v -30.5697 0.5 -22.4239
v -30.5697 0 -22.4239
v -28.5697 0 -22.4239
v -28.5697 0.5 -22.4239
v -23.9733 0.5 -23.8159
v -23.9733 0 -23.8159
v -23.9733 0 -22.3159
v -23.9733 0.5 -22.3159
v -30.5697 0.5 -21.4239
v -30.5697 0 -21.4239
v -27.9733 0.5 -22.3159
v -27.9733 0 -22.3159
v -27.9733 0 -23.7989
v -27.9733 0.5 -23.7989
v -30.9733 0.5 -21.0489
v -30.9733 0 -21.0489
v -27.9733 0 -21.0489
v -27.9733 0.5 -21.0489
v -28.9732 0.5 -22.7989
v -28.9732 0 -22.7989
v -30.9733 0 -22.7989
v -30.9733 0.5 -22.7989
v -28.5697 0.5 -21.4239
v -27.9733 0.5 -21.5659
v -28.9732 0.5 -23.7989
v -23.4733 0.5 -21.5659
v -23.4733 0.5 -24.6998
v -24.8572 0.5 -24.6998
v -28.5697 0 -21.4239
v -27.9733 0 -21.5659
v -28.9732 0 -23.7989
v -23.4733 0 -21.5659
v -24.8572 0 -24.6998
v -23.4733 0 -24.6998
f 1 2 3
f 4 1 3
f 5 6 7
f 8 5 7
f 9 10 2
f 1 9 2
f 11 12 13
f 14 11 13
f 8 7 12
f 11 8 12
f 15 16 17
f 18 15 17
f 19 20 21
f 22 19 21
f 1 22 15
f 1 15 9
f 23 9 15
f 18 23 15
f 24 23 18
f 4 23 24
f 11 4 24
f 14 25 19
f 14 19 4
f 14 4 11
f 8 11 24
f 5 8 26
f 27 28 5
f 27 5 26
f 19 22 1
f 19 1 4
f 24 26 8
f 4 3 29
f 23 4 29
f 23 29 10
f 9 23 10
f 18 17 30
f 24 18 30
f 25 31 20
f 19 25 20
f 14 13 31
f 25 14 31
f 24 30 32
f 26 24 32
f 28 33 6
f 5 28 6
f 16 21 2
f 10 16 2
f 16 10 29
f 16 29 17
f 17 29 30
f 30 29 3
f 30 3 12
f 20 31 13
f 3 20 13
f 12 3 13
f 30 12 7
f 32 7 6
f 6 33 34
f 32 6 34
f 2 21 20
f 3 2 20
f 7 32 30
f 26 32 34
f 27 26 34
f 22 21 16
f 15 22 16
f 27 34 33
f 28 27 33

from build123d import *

# Parameters (mm, degrees)
BOSS_EXTRUDE1_DEPTH = 0.5


with BuildPart() as part:
    # Sketch1 → Boss-Extrude1 (new body)
    with BuildSketch(Plane(origin=(0, 0, 0), x_dir=(1, 0, 0), z_dir=(0, 1, 0))):
        Polygon((-23.973296771, 22.315949047), (-27.973296771, 22.315949047), (-27.973296771, 23.798880368), (-28.973178979, 23.798880368), (-28.973178979, 22.798880368), (-30.973296771, 22.798880368), (-30.973296771, 21.923880368), (-30.973296771, 21.048880368), (-27.973296771, 21.048880368), (-27.973296771, 21.565949047), (-23.473296771, 21.565949047), (-23.473296771, 24.699832523), (-24.857180247, 24.699832523), (-23.973296771, 23.815949047), align=None)
        Polygon((-30.569749298, 21.423880368), (-30.569749298, 21.923880368), (-30.569749298, 22.423880368), (-28.569749298, 22.423880368), (-28.569749298, 21.423880368), align=None, mode=Mode.SUBTRACT)
    extrude(amount=BOSS_EXTRUDE1_DEPTH)


solid = part.part
